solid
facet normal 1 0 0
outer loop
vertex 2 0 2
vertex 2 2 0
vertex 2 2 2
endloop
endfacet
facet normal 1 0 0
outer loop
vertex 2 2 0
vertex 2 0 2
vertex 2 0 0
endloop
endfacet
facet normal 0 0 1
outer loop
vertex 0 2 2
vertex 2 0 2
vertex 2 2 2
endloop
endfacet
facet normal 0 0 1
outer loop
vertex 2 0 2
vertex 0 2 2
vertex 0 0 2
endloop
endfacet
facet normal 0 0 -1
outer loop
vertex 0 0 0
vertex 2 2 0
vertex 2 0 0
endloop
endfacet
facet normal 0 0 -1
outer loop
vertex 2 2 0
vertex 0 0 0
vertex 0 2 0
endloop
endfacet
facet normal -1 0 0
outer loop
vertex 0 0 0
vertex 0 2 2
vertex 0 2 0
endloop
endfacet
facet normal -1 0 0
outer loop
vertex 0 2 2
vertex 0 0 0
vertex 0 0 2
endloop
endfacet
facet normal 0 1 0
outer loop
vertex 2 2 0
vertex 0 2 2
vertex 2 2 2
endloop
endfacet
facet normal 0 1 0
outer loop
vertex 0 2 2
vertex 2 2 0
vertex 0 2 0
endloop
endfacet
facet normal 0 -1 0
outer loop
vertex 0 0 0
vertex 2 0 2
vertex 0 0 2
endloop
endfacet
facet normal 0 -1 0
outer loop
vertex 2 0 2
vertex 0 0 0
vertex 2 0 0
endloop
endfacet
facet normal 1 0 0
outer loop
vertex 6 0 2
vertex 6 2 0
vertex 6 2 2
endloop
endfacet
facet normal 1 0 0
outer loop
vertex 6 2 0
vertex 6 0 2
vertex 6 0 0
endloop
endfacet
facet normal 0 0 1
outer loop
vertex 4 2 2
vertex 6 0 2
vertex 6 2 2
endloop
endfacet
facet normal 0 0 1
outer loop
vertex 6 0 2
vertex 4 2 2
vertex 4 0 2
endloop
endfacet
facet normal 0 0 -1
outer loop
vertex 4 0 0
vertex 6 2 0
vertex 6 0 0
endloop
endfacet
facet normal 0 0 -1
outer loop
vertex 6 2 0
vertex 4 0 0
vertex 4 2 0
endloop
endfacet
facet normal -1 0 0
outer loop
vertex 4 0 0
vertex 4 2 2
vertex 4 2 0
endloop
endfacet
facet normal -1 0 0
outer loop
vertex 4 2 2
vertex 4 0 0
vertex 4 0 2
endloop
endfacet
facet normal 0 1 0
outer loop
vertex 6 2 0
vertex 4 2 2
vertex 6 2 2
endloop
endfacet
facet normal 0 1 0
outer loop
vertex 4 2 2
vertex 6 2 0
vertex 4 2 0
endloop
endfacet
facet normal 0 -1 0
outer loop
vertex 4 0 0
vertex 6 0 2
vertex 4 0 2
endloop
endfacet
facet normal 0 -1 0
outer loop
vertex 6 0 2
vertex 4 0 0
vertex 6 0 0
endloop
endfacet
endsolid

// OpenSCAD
union() {
  translate([0, 0, 0]) cube(size=[2,2,2], center=false);
  translate([4, 0, 0]) cube(size=[2,2,2], center=false);
}
